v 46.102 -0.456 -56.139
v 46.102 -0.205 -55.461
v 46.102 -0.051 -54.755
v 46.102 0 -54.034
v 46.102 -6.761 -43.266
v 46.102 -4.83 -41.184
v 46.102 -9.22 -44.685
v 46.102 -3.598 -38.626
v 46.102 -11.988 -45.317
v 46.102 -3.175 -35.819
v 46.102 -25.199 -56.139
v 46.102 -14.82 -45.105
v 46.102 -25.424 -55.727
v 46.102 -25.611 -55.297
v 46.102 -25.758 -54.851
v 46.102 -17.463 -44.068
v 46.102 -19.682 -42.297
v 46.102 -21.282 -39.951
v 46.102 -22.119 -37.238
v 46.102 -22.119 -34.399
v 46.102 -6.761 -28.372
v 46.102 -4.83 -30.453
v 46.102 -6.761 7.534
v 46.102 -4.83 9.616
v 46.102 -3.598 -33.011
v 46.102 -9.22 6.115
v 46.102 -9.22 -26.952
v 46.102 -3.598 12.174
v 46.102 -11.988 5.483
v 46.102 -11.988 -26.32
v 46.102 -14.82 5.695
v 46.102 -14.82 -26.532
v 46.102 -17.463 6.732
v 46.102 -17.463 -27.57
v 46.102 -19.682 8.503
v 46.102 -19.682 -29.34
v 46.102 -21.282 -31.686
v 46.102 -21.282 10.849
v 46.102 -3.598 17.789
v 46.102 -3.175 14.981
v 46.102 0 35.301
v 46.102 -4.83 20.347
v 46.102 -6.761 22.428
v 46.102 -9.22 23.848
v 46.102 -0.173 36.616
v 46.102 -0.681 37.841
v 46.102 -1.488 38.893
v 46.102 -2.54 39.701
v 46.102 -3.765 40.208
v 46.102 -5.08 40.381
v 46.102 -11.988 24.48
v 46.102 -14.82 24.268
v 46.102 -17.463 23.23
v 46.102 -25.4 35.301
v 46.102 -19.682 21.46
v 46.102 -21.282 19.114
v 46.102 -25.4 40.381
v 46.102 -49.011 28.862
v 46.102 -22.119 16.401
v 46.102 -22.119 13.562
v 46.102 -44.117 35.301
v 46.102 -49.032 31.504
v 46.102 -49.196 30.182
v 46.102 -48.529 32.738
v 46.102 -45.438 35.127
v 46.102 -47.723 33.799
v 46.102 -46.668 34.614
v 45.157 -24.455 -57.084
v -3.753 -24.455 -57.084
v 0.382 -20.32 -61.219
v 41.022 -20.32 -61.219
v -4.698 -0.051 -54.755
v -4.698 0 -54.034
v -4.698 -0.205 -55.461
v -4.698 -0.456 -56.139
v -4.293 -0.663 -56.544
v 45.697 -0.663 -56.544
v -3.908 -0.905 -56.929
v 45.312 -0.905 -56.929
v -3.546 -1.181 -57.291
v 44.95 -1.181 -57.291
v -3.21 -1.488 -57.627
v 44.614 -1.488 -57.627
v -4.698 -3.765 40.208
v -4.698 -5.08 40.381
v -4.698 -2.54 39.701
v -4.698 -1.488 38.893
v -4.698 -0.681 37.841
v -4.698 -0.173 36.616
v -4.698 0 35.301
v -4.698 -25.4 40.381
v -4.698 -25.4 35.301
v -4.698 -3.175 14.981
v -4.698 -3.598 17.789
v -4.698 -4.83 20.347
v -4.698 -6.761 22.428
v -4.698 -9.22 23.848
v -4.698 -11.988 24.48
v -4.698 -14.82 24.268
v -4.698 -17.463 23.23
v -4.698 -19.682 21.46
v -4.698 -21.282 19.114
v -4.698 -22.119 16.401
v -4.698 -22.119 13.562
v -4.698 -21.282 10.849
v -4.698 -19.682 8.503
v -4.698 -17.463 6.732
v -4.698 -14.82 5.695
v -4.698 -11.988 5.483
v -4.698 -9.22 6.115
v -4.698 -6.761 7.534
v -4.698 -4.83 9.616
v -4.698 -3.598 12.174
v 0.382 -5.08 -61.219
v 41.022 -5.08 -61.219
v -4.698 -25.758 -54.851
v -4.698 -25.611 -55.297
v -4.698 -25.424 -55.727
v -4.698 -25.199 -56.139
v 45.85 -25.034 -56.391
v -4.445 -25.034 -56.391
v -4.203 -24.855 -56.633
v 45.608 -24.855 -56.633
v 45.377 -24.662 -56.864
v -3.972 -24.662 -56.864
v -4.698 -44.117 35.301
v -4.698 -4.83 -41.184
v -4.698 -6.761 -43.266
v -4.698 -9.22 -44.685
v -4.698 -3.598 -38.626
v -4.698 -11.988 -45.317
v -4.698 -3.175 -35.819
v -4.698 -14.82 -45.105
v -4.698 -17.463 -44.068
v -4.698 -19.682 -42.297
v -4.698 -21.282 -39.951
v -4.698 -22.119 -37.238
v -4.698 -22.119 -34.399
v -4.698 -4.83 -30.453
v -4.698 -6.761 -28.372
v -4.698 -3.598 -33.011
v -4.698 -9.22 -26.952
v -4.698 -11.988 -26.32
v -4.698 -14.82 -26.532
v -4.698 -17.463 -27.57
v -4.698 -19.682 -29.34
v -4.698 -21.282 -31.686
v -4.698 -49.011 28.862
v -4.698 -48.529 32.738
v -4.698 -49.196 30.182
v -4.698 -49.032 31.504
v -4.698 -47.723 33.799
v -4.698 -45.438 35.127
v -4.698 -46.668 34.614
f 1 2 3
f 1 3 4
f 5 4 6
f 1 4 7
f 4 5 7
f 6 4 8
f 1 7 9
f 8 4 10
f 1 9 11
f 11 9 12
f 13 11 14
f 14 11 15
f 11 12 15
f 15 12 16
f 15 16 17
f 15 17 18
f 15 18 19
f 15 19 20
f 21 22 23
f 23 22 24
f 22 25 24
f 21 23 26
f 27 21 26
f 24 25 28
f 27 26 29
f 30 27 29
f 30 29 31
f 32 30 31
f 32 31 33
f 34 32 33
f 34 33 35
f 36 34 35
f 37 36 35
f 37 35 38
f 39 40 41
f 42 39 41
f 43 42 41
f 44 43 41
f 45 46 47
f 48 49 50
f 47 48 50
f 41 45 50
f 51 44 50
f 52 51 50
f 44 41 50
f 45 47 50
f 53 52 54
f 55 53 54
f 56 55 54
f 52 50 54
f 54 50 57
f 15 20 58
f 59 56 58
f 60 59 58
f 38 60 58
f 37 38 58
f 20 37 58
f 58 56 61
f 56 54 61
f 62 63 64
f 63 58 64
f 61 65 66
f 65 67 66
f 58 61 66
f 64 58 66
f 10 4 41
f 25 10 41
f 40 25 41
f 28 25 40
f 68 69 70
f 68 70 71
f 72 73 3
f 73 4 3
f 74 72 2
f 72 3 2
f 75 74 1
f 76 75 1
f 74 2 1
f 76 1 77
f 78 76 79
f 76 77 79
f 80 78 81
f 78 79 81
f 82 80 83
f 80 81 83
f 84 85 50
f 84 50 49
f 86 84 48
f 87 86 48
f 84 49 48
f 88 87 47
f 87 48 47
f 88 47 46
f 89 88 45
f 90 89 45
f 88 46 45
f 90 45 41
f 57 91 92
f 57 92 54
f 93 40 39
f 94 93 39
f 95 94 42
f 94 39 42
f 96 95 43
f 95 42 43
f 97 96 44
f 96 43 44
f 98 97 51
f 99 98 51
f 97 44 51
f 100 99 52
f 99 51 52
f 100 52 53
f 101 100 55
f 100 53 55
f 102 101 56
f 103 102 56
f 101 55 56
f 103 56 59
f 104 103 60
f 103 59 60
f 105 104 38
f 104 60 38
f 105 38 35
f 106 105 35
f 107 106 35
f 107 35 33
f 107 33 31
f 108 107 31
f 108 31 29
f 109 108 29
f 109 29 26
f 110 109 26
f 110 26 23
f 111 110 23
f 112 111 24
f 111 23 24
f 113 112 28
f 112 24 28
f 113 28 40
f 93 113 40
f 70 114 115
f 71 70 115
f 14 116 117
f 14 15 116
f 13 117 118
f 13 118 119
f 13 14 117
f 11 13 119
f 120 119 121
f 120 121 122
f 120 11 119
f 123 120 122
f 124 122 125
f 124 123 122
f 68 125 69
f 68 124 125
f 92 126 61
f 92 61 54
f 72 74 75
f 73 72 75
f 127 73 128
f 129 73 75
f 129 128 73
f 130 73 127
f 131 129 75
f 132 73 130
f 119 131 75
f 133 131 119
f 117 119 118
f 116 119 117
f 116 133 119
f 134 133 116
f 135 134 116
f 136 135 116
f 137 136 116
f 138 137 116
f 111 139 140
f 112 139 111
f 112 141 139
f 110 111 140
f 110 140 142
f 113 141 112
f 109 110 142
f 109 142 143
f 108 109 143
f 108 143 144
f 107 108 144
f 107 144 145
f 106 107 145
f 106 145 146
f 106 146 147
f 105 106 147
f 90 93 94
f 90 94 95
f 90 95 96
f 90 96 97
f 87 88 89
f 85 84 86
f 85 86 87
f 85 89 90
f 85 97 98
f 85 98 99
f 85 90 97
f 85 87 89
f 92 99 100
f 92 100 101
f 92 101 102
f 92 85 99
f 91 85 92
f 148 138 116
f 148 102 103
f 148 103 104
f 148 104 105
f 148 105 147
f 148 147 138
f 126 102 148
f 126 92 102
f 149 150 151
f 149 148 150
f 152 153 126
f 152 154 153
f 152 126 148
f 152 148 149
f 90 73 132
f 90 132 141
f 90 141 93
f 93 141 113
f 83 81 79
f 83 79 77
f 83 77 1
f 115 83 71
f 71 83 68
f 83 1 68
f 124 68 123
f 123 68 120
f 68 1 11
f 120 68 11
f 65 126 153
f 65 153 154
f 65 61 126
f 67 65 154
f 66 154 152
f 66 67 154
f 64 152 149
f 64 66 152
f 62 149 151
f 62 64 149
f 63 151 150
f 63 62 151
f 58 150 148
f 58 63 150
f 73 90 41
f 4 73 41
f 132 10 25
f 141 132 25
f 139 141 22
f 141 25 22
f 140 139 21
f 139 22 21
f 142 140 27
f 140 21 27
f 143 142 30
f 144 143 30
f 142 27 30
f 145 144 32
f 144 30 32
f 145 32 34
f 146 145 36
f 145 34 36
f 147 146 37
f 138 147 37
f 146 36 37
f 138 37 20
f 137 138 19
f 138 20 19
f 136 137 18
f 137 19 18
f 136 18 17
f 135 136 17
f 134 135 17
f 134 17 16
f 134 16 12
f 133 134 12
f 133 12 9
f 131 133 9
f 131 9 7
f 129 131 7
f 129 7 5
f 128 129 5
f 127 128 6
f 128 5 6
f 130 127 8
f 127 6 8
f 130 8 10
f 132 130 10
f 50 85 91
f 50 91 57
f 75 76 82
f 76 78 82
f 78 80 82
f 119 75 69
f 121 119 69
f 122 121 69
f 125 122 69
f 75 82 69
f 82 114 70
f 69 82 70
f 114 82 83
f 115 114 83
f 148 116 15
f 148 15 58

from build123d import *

# Parameters (mm, degrees)
F0_W     = 50.8
F0_H     = 101.6
F1_DEPTH = 25.4
F2_R     = 9.525
F3_DEPTH = 50.8
F4_SIZE  = 5.08
F7_DEPTH = 50.8
F8_R     = 5.08


# Not quite as in the source:
# - a feature of the source that left no trace in its solid (it failed there, or was rolled back) is left out


with BuildPart() as f1:
    # F0 (on Front) → F1 (new body)
    with BuildSketch(Plane.XZ):
        with Locations((20.7021635301, -10.4186603248)):
            Rectangle(F0_W, F0_H)
    extrude(amount=F1_DEPTH)

    # F2 (on face) → F3 (cut)
    with BuildSketch(Plane.YZ.offset(46.1021635301)):
        with Locations((-12.7, 14.9813396752)):
            Circle(F2_R)
        with Locations((-12.7, -35.8186603248)):
            Circle(F2_R)
    extrude(amount=-F3_DEPTH, mode=Mode.SUBTRACT)

    # F4
    f4_edges = [f1.edges().sort_by_distance(p)[0] for p in [
        (-4.697836, -12.7, -61.21866),
        (46.102164, -12.7, -61.21866),
        (20.702164, 0, -61.21866),
        (20.702164, -25.4, -61.21866),
    ]]
    chamfer(f4_edges, length=F4_SIZE)

    # F6 (on face) → F7 (join)
    with BuildSketch(Plane(origin=(-4.6978364699, 0, 0), x_dir=(0, -1, 0), z_dir=(-1, 0, 0))):
        Polygon((50.8, 35.3013396752), (25.4, 35.3013396752), (25.4, -56.1386603248), align=None)
    extrude(amount=-F7_DEPTH)

    # F8
    f8_edges = [f1.edges().sort_by_distance(p)[0] for p in [
        (20.702164, -50.8, 35.30134),
        (20.702164, 0, 40.38134),
        (20.702164, -25.4, -56.13866),
        (20.702164, 0, -56.13866),
    ]]
    fillet(f8_edges, radius=F8_R)


solid = f1.part
